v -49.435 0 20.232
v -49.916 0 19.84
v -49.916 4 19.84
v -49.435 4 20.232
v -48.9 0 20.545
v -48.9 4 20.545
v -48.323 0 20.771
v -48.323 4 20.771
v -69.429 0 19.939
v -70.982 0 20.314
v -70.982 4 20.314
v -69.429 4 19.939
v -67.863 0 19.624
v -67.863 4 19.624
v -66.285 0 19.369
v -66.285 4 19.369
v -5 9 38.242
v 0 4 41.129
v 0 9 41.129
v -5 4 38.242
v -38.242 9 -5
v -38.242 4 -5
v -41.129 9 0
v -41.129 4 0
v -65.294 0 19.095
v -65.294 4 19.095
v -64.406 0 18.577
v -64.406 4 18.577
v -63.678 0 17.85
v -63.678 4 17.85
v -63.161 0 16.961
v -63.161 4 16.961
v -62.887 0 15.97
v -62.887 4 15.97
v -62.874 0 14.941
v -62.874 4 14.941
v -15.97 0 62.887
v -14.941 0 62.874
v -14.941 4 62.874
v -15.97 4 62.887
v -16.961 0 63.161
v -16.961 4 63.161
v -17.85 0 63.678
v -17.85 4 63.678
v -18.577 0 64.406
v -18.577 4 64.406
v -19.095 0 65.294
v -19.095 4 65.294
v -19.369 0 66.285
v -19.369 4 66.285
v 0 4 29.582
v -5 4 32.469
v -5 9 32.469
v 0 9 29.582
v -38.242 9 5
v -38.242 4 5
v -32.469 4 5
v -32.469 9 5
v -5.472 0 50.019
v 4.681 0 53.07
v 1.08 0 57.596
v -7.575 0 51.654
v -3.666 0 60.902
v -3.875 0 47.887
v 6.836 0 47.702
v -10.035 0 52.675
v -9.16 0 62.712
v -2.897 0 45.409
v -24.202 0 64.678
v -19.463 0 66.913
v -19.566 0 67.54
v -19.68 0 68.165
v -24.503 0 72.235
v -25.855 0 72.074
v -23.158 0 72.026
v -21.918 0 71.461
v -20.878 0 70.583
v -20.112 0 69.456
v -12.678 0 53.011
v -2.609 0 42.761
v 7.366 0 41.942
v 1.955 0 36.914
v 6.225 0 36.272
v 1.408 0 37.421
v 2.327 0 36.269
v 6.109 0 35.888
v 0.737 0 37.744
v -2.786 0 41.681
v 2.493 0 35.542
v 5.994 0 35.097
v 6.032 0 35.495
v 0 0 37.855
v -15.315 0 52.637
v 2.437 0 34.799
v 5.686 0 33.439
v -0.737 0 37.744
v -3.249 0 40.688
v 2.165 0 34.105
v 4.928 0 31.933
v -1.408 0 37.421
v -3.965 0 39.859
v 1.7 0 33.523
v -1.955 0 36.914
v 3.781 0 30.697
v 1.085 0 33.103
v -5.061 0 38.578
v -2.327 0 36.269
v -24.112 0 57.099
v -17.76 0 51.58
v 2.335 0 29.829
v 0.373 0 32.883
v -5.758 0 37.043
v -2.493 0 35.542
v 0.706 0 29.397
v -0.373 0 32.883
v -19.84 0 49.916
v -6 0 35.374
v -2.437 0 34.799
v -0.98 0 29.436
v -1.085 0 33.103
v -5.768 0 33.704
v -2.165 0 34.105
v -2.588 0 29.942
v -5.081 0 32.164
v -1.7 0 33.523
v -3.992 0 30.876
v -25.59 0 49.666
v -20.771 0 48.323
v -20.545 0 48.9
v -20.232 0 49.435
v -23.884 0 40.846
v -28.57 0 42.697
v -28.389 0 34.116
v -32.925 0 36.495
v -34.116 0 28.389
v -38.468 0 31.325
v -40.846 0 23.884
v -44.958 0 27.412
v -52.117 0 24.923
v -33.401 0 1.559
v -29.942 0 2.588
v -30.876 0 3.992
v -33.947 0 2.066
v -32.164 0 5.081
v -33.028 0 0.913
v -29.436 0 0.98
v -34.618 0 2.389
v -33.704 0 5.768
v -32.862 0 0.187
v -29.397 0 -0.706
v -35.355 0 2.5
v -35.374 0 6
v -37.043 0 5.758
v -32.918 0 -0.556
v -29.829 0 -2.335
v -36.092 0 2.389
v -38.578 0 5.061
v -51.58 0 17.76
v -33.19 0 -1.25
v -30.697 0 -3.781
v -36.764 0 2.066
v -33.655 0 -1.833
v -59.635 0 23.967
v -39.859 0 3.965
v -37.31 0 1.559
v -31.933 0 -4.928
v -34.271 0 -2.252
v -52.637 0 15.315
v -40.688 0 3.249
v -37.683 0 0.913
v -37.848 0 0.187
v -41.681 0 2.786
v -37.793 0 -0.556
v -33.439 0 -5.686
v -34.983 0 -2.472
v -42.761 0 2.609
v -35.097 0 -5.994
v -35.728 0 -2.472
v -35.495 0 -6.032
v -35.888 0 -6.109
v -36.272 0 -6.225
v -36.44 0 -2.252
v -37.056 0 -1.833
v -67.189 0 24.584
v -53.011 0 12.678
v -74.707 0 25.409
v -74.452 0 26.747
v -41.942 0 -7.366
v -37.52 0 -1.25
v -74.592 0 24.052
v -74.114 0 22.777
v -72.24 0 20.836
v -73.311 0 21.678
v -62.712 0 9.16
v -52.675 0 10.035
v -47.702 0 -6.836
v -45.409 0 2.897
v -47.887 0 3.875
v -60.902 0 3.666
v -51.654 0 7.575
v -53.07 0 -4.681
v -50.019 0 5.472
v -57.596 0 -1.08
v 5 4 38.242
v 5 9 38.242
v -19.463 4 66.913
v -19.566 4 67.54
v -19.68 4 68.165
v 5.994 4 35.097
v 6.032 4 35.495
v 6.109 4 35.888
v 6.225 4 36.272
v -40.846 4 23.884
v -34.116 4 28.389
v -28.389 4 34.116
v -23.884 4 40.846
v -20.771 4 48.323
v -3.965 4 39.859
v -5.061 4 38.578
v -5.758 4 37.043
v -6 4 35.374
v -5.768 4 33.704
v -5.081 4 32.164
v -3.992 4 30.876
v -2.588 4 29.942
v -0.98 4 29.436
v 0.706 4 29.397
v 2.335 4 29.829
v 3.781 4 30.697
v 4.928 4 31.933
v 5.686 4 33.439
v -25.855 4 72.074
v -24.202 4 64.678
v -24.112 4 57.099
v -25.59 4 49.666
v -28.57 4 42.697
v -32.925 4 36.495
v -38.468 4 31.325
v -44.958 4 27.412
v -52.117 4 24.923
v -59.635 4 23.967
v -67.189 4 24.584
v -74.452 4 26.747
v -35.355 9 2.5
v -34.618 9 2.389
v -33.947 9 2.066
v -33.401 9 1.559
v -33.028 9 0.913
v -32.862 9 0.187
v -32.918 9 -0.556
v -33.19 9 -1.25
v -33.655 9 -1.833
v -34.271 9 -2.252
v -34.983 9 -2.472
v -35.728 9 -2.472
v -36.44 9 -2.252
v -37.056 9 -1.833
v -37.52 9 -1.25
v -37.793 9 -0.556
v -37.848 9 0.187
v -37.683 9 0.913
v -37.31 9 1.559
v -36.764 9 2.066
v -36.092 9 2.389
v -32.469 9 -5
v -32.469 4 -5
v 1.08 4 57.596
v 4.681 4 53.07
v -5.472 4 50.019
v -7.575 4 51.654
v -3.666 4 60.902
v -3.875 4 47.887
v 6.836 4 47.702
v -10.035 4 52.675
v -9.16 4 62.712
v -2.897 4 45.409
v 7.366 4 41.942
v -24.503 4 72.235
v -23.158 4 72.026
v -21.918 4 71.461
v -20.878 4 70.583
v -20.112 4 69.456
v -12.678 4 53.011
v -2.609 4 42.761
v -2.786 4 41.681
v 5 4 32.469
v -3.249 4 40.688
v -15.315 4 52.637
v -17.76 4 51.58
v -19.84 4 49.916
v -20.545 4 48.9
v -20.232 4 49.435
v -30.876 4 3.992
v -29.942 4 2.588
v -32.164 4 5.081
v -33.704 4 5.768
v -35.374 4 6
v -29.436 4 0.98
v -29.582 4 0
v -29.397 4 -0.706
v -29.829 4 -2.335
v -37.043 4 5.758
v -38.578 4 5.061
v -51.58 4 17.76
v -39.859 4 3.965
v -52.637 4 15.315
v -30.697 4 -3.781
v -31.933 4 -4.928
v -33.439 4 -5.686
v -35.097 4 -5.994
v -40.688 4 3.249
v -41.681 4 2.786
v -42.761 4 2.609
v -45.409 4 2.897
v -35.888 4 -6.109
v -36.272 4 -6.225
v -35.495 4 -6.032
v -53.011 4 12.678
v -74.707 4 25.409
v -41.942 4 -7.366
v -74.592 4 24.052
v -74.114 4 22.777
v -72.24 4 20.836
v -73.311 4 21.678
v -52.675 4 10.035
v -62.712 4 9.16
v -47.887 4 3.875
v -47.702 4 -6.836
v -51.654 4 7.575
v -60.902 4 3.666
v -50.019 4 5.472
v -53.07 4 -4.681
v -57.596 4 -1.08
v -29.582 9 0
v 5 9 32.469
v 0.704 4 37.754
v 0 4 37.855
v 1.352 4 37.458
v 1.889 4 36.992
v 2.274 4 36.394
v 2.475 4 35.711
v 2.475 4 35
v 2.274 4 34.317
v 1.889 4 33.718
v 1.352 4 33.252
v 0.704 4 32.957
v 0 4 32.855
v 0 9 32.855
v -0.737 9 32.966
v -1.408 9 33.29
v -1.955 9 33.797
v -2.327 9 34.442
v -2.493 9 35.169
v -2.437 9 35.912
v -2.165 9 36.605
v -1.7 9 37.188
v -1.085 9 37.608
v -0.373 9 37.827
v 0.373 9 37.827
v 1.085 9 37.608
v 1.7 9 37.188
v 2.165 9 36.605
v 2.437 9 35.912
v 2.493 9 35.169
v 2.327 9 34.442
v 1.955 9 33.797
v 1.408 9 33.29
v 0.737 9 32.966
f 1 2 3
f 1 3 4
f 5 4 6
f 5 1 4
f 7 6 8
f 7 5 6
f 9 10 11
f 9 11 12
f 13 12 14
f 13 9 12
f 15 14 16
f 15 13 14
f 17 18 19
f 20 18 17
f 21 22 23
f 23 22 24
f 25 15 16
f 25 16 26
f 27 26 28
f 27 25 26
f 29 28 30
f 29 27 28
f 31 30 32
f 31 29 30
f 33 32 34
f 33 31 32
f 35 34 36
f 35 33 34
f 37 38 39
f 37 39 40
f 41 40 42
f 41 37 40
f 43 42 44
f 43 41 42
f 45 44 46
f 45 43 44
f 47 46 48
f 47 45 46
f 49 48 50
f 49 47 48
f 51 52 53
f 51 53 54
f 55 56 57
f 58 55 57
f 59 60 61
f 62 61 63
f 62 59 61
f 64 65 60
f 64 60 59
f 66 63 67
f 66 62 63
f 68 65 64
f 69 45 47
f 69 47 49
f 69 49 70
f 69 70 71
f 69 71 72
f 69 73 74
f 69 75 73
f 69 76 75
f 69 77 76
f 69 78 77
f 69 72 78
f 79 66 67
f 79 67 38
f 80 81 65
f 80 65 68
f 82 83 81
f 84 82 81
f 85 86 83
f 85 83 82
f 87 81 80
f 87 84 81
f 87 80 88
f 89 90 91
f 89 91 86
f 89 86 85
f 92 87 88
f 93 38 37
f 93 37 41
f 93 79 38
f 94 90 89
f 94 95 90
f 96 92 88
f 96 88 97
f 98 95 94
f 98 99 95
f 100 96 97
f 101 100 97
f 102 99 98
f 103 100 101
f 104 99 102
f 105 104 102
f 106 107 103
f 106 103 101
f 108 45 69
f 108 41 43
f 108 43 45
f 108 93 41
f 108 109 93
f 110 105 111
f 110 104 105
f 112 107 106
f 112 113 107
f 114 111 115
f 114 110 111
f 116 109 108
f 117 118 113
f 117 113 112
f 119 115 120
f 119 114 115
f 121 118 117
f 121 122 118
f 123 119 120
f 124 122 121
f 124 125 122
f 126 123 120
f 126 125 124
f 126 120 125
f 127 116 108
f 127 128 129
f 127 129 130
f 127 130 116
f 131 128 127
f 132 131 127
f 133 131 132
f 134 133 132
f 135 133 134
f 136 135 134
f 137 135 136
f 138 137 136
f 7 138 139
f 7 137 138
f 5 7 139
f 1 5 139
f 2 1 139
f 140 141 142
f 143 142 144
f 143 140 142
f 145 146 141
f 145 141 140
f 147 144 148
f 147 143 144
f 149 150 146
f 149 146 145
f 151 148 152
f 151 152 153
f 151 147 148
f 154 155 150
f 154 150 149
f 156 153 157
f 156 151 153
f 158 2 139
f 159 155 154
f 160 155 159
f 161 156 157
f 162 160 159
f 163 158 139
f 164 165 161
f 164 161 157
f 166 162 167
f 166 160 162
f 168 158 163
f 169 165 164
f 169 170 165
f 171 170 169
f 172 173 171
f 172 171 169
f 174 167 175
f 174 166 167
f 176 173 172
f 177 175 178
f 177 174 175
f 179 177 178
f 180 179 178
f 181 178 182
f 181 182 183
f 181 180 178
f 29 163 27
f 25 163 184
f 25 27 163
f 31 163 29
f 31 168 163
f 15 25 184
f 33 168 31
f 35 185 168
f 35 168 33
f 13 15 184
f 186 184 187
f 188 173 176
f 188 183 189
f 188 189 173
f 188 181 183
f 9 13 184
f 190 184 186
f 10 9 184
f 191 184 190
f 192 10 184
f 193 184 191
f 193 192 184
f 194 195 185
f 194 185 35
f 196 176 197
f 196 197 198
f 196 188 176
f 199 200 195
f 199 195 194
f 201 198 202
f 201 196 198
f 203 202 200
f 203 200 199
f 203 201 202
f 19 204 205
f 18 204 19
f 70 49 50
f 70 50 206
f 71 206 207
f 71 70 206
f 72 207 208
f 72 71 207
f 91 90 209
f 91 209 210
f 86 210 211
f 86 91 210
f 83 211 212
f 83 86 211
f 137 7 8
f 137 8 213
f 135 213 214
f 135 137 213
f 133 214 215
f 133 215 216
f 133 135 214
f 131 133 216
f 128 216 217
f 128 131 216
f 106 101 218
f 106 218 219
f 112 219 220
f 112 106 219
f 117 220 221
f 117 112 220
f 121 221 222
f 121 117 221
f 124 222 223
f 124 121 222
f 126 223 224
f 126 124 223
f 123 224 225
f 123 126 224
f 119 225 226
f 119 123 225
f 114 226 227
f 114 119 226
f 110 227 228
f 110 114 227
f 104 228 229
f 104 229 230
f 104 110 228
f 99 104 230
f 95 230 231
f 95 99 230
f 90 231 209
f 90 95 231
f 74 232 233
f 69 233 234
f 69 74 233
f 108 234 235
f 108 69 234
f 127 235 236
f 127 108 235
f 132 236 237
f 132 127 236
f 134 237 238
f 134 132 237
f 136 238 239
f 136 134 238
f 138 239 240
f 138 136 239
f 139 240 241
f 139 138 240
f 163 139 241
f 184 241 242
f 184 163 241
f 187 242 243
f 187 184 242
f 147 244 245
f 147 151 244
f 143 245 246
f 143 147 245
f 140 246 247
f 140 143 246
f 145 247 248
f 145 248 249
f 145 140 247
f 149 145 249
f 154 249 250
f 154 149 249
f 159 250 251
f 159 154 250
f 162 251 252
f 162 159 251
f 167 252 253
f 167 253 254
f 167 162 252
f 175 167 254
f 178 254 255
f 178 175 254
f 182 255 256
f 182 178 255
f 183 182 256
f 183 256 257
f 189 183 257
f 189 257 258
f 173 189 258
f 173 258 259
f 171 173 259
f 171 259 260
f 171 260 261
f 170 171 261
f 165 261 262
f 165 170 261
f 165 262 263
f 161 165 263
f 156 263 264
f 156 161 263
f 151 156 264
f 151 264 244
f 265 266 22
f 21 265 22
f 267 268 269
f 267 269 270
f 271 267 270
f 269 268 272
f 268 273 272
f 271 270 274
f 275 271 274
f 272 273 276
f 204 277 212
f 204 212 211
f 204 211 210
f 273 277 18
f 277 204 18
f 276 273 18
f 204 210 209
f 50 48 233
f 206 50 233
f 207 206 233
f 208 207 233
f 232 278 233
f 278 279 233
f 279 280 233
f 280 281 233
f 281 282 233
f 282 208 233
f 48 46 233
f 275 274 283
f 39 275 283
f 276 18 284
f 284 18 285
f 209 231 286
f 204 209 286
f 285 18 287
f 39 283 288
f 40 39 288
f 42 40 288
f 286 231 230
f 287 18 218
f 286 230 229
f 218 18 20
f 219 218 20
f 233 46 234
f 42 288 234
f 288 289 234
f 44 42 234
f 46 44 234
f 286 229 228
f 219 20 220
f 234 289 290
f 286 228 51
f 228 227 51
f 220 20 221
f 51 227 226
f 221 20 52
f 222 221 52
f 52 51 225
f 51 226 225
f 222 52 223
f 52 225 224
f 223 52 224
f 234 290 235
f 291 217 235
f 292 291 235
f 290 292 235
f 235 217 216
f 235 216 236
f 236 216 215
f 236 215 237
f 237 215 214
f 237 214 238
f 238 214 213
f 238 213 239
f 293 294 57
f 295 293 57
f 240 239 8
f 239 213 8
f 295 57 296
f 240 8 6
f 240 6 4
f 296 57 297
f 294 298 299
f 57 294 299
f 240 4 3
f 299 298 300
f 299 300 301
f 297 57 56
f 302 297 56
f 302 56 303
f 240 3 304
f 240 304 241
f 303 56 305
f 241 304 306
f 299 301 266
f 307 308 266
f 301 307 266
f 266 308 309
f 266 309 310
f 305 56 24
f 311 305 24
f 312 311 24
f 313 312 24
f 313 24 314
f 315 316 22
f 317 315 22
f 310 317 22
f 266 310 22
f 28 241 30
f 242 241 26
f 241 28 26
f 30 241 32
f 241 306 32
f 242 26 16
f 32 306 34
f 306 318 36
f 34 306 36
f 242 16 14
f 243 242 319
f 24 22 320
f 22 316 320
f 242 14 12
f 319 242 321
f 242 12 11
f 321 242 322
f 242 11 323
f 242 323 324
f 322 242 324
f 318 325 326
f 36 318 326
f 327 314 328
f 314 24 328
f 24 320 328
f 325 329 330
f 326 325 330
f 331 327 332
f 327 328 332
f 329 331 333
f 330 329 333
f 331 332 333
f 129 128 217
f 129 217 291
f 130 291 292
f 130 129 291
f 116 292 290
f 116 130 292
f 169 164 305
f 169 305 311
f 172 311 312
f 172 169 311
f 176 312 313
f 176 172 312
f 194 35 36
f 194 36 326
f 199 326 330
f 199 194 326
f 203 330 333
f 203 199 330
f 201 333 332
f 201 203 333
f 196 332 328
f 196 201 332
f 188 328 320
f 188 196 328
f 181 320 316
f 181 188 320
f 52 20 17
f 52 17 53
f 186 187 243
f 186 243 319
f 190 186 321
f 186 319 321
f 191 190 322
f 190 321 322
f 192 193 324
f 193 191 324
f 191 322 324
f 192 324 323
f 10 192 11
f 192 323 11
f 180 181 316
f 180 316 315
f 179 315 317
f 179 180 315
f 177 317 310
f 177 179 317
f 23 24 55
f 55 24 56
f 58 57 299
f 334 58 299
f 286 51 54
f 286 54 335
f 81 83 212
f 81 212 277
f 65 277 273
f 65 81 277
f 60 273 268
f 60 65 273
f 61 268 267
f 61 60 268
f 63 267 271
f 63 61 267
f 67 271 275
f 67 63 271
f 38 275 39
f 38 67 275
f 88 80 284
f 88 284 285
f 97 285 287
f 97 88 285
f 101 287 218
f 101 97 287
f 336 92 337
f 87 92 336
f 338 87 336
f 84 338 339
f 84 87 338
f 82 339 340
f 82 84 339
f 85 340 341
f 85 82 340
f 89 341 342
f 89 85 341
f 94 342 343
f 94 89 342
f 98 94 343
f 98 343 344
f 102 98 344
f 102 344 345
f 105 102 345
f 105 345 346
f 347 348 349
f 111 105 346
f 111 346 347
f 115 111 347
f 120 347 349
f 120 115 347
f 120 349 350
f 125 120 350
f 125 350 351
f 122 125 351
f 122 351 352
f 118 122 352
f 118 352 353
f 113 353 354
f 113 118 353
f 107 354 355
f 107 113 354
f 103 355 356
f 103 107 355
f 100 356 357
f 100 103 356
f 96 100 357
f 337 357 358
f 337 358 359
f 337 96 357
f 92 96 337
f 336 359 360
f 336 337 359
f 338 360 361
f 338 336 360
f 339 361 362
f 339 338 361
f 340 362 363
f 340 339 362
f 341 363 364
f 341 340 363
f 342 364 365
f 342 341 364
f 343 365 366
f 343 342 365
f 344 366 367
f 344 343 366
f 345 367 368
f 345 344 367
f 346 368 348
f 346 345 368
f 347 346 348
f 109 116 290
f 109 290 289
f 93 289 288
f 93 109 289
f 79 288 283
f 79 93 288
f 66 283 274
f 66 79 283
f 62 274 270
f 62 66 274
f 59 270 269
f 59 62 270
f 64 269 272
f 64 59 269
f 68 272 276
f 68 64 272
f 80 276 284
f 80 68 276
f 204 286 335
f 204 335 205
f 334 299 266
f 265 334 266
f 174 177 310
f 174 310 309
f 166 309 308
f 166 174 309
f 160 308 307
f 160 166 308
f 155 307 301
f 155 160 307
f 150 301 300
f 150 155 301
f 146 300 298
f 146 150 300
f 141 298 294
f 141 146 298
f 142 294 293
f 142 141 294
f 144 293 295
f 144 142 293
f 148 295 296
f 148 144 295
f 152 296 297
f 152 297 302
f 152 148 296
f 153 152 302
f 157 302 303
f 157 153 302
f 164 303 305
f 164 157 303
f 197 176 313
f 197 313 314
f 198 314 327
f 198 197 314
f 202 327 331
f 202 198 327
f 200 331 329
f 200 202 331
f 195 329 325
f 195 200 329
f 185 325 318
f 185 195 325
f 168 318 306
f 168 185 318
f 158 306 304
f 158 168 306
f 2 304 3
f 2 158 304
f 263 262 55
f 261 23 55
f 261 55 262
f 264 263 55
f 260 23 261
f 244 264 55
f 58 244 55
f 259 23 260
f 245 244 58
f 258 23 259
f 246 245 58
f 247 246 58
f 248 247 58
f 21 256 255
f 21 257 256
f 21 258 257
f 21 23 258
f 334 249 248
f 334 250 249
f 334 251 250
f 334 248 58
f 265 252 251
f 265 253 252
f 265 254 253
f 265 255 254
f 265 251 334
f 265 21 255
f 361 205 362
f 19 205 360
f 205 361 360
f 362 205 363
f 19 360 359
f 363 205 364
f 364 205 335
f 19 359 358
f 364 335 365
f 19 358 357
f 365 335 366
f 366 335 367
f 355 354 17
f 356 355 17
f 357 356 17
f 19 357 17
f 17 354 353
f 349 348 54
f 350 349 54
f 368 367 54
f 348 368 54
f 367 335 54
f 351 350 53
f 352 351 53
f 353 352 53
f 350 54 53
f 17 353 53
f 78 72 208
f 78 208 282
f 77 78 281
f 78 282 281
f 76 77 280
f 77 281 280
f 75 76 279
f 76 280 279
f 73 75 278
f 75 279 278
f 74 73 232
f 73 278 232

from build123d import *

# Parameters (mm, degrees)
SKETCH1_R           = 2.5
SKETCH1_R_2         = 36.5
BOSS_EXTRUDE1_DEPTH = 4
SKETCH2_R           = 2.5
BOSS_EXTRUDE2_DEPTH = 5
SKETCH3_R           = 64.411178088
CUT_EXTRUDE1_DEPTH  = 10
FILLET1_R           = 5


with BuildPart() as part:
    # Sketch1 → Boss-Extrude1 (new body)
    with BuildSketch(Plane(origin=(0, 0, 0), x_dir=(1, 0, 0), z_dir=(0, 1, 0))):
        with BuildLine():
            ThreePointArc((-35.096538253, 5.994415913), (-29.942413888, -2.588482391), (-39.858946955, -3.964532245))
            ThreePointArc((-39.858946955, -3.964532245), (-41.168529898, -2.983419005), (-42.761405669, -2.608802601))
            ThreePointArc((-42.761405669, -2.608802601), (-52.246827812, -8.771034491), (-49.915694824, -19.839555354))
            ThreePointArc((-49.915694824, -19.839555354), (-49.174030159, -20.398421652), (-48.323482114, -20.771203143))
            ThreePointArc((-48.323482114, -20.771203143), (-31.112698372, -31.112698372), (-20.771203143, -48.323482114))
            ThreePointArc((-20.771203143, -48.323482114), (-20.398421652, -49.174030159), (-19.839555354, -49.915694824))
            ThreePointArc((-19.839555354, -49.915694824), (-8.771034491, -52.246827812), (-2.608802601, -42.761405669))
            ThreePointArc((-2.608802601, -42.761405669), (-2.983419005, -41.168529898), (-3.964532245, -39.858946955))
            ThreePointArc((-3.964532245, -39.858946955), (-2.588482391, -29.942413888), (5.994415913, -35.096538253))
            ThreePointArc((5.994415913, -35.096538253), (6.065284008, -35.692875475), (6.224630915, -36.271882326))
            ThreePointArc((6.224630915, -36.271882326), (3.044943645, -55.463499369), (-14.941352097, -62.87441978))
            ThreePointArc((-14.941352097, -62.87441978), (-17.849646318, -63.67833691), (-19.368850678, -66.285342115))
            ThreePointArc((-19.368850678, -66.285342115), (-89.802561211, -89.802561211), (-66.285342115, -19.368850678))
            ThreePointArc((-66.285342115, -19.368850678), (-63.67833691, -17.849646318), (-62.87441978, -14.941352097))
            ThreePointArc((-62.87441978, -14.941352097), (-55.463499369, 3.044943645), (-36.271882326, 6.224630915))
            ThreePointArc((-36.271882326, 6.224630915), (-35.692875475, 6.065284008), (-35.096538253, 5.994415913))
        make_face()
        with Locations(Location((0, -35.355339059, 0), (0, 0, 270))):
            Circle(SKETCH1_R, mode=Mode.SUBTRACT)
        with Locations(Location((-35.355339059, 0, 0), (0, 0, 270))):
            Circle(SKETCH1_R, mode=Mode.SUBTRACT)
        with Locations(Location((-60.457629791, -60.457629791, 0), (0, 0, 270))):
            Circle(SKETCH1_R_2, mode=Mode.SUBTRACT)
    extrude(amount=BOSS_EXTRUDE1_DEPTH)

    # Sketch2 → Boss-Extrude2 (add)
    # profile 1 of 2: a face of its own
    with BuildSketch(Plane(origin=(0, 4, 0), x_dir=(1, 0, 0), z_dir=(0, 1, 0))):
        Polygon((-32.468587713, -5), (-29.581836367, 0), (-32.468587713, 5), (-38.242090405, 5), (-41.128841751, 0), (-38.242090405, -5), align=None)
        with Locations(Location((-35.355339059, 0, 0), (0, 0, 270))):
            Circle(SKETCH2_R, mode=Mode.SUBTRACT)
    # profile 2 of 2: a face of its own
    with BuildSketch(Plane(origin=(0, 4, 0), x_dir=(1, 0, 0), z_dir=(0, 1, 0))):
        Polygon((-5, -38.242090405), (-5, -32.468587713), (0, -29.581836367), (5, -32.468587713), (5, -38.242090405), (0, -41.128841751), align=None)
        with Locations(Location((0, -35.355339059, 0), (0, 0, 90))):
            Circle(SKETCH2_R, mode=Mode.SUBTRACT)
    extrude(amount=BOSS_EXTRUDE2_DEPTH)

    # Sketch3 → Cut-Extrude1 (cut)
    with BuildSketch(Plane(origin=(0, 4, 0), x_dir=(1, 0, 0), z_dir=(0, 1, 0))):
        with Locations((-87.790328178, -89.76214525)):
            Circle(SKETCH3_R)
    extrude(amount=-CUT_EXTRUDE1_DEPTH, mode=Mode.SUBTRACT)

    # Fillet1
    # the kernel refuses this fillet: 5 mm, written as the material it takes off along each edge
    with BuildSketch(Plane(origin=(-82.88269404, 36.492109743, 25.538201196), x_dir=(0.9156666742355372, 0, -0.40193847998721216), z_dir=(0, -1, 0))) as fillet1_piece_1:
        with BuildLine():
            CenterArc((12.213901494, 4.938319673), FILLET1_R, 185.081491193, 93.927443362)
            ThreePointArc((7.233552845, 4.495457015), (3.691158281, 2.128042099), (0, 0))
            ThreePointArc((0, 0), (6.498421949, -0.511946714), (12.996843897, 0))
        make_face()
    extrude(amount=68.984219486, mode=Mode.SUBTRACT)
    with BuildSketch(Plane(origin=(-24.063187691, 36.492109743, 80.399911111), x_dir=(-0.2104426135040135, 0, -0.9776062123481011), z_dir=(0, -1, 0))) as fillet1_piece_2:
        with BuildLine():
            CenterArc((12.98043651, 2.252700357), FILLET1_R, 112.850896292, 93.927443362)
            ThreePointArc((11.038764851, 6.860293131), (5.249154934, 3.86496439), (0, 0))
            ThreePointArc((0, 0), (4.258327739, 0.140916633), (8.516655478, 0))
        make_face()
    extrude(amount=68.984219486, mode=Mode.SUBTRACT)


solid = part.part
